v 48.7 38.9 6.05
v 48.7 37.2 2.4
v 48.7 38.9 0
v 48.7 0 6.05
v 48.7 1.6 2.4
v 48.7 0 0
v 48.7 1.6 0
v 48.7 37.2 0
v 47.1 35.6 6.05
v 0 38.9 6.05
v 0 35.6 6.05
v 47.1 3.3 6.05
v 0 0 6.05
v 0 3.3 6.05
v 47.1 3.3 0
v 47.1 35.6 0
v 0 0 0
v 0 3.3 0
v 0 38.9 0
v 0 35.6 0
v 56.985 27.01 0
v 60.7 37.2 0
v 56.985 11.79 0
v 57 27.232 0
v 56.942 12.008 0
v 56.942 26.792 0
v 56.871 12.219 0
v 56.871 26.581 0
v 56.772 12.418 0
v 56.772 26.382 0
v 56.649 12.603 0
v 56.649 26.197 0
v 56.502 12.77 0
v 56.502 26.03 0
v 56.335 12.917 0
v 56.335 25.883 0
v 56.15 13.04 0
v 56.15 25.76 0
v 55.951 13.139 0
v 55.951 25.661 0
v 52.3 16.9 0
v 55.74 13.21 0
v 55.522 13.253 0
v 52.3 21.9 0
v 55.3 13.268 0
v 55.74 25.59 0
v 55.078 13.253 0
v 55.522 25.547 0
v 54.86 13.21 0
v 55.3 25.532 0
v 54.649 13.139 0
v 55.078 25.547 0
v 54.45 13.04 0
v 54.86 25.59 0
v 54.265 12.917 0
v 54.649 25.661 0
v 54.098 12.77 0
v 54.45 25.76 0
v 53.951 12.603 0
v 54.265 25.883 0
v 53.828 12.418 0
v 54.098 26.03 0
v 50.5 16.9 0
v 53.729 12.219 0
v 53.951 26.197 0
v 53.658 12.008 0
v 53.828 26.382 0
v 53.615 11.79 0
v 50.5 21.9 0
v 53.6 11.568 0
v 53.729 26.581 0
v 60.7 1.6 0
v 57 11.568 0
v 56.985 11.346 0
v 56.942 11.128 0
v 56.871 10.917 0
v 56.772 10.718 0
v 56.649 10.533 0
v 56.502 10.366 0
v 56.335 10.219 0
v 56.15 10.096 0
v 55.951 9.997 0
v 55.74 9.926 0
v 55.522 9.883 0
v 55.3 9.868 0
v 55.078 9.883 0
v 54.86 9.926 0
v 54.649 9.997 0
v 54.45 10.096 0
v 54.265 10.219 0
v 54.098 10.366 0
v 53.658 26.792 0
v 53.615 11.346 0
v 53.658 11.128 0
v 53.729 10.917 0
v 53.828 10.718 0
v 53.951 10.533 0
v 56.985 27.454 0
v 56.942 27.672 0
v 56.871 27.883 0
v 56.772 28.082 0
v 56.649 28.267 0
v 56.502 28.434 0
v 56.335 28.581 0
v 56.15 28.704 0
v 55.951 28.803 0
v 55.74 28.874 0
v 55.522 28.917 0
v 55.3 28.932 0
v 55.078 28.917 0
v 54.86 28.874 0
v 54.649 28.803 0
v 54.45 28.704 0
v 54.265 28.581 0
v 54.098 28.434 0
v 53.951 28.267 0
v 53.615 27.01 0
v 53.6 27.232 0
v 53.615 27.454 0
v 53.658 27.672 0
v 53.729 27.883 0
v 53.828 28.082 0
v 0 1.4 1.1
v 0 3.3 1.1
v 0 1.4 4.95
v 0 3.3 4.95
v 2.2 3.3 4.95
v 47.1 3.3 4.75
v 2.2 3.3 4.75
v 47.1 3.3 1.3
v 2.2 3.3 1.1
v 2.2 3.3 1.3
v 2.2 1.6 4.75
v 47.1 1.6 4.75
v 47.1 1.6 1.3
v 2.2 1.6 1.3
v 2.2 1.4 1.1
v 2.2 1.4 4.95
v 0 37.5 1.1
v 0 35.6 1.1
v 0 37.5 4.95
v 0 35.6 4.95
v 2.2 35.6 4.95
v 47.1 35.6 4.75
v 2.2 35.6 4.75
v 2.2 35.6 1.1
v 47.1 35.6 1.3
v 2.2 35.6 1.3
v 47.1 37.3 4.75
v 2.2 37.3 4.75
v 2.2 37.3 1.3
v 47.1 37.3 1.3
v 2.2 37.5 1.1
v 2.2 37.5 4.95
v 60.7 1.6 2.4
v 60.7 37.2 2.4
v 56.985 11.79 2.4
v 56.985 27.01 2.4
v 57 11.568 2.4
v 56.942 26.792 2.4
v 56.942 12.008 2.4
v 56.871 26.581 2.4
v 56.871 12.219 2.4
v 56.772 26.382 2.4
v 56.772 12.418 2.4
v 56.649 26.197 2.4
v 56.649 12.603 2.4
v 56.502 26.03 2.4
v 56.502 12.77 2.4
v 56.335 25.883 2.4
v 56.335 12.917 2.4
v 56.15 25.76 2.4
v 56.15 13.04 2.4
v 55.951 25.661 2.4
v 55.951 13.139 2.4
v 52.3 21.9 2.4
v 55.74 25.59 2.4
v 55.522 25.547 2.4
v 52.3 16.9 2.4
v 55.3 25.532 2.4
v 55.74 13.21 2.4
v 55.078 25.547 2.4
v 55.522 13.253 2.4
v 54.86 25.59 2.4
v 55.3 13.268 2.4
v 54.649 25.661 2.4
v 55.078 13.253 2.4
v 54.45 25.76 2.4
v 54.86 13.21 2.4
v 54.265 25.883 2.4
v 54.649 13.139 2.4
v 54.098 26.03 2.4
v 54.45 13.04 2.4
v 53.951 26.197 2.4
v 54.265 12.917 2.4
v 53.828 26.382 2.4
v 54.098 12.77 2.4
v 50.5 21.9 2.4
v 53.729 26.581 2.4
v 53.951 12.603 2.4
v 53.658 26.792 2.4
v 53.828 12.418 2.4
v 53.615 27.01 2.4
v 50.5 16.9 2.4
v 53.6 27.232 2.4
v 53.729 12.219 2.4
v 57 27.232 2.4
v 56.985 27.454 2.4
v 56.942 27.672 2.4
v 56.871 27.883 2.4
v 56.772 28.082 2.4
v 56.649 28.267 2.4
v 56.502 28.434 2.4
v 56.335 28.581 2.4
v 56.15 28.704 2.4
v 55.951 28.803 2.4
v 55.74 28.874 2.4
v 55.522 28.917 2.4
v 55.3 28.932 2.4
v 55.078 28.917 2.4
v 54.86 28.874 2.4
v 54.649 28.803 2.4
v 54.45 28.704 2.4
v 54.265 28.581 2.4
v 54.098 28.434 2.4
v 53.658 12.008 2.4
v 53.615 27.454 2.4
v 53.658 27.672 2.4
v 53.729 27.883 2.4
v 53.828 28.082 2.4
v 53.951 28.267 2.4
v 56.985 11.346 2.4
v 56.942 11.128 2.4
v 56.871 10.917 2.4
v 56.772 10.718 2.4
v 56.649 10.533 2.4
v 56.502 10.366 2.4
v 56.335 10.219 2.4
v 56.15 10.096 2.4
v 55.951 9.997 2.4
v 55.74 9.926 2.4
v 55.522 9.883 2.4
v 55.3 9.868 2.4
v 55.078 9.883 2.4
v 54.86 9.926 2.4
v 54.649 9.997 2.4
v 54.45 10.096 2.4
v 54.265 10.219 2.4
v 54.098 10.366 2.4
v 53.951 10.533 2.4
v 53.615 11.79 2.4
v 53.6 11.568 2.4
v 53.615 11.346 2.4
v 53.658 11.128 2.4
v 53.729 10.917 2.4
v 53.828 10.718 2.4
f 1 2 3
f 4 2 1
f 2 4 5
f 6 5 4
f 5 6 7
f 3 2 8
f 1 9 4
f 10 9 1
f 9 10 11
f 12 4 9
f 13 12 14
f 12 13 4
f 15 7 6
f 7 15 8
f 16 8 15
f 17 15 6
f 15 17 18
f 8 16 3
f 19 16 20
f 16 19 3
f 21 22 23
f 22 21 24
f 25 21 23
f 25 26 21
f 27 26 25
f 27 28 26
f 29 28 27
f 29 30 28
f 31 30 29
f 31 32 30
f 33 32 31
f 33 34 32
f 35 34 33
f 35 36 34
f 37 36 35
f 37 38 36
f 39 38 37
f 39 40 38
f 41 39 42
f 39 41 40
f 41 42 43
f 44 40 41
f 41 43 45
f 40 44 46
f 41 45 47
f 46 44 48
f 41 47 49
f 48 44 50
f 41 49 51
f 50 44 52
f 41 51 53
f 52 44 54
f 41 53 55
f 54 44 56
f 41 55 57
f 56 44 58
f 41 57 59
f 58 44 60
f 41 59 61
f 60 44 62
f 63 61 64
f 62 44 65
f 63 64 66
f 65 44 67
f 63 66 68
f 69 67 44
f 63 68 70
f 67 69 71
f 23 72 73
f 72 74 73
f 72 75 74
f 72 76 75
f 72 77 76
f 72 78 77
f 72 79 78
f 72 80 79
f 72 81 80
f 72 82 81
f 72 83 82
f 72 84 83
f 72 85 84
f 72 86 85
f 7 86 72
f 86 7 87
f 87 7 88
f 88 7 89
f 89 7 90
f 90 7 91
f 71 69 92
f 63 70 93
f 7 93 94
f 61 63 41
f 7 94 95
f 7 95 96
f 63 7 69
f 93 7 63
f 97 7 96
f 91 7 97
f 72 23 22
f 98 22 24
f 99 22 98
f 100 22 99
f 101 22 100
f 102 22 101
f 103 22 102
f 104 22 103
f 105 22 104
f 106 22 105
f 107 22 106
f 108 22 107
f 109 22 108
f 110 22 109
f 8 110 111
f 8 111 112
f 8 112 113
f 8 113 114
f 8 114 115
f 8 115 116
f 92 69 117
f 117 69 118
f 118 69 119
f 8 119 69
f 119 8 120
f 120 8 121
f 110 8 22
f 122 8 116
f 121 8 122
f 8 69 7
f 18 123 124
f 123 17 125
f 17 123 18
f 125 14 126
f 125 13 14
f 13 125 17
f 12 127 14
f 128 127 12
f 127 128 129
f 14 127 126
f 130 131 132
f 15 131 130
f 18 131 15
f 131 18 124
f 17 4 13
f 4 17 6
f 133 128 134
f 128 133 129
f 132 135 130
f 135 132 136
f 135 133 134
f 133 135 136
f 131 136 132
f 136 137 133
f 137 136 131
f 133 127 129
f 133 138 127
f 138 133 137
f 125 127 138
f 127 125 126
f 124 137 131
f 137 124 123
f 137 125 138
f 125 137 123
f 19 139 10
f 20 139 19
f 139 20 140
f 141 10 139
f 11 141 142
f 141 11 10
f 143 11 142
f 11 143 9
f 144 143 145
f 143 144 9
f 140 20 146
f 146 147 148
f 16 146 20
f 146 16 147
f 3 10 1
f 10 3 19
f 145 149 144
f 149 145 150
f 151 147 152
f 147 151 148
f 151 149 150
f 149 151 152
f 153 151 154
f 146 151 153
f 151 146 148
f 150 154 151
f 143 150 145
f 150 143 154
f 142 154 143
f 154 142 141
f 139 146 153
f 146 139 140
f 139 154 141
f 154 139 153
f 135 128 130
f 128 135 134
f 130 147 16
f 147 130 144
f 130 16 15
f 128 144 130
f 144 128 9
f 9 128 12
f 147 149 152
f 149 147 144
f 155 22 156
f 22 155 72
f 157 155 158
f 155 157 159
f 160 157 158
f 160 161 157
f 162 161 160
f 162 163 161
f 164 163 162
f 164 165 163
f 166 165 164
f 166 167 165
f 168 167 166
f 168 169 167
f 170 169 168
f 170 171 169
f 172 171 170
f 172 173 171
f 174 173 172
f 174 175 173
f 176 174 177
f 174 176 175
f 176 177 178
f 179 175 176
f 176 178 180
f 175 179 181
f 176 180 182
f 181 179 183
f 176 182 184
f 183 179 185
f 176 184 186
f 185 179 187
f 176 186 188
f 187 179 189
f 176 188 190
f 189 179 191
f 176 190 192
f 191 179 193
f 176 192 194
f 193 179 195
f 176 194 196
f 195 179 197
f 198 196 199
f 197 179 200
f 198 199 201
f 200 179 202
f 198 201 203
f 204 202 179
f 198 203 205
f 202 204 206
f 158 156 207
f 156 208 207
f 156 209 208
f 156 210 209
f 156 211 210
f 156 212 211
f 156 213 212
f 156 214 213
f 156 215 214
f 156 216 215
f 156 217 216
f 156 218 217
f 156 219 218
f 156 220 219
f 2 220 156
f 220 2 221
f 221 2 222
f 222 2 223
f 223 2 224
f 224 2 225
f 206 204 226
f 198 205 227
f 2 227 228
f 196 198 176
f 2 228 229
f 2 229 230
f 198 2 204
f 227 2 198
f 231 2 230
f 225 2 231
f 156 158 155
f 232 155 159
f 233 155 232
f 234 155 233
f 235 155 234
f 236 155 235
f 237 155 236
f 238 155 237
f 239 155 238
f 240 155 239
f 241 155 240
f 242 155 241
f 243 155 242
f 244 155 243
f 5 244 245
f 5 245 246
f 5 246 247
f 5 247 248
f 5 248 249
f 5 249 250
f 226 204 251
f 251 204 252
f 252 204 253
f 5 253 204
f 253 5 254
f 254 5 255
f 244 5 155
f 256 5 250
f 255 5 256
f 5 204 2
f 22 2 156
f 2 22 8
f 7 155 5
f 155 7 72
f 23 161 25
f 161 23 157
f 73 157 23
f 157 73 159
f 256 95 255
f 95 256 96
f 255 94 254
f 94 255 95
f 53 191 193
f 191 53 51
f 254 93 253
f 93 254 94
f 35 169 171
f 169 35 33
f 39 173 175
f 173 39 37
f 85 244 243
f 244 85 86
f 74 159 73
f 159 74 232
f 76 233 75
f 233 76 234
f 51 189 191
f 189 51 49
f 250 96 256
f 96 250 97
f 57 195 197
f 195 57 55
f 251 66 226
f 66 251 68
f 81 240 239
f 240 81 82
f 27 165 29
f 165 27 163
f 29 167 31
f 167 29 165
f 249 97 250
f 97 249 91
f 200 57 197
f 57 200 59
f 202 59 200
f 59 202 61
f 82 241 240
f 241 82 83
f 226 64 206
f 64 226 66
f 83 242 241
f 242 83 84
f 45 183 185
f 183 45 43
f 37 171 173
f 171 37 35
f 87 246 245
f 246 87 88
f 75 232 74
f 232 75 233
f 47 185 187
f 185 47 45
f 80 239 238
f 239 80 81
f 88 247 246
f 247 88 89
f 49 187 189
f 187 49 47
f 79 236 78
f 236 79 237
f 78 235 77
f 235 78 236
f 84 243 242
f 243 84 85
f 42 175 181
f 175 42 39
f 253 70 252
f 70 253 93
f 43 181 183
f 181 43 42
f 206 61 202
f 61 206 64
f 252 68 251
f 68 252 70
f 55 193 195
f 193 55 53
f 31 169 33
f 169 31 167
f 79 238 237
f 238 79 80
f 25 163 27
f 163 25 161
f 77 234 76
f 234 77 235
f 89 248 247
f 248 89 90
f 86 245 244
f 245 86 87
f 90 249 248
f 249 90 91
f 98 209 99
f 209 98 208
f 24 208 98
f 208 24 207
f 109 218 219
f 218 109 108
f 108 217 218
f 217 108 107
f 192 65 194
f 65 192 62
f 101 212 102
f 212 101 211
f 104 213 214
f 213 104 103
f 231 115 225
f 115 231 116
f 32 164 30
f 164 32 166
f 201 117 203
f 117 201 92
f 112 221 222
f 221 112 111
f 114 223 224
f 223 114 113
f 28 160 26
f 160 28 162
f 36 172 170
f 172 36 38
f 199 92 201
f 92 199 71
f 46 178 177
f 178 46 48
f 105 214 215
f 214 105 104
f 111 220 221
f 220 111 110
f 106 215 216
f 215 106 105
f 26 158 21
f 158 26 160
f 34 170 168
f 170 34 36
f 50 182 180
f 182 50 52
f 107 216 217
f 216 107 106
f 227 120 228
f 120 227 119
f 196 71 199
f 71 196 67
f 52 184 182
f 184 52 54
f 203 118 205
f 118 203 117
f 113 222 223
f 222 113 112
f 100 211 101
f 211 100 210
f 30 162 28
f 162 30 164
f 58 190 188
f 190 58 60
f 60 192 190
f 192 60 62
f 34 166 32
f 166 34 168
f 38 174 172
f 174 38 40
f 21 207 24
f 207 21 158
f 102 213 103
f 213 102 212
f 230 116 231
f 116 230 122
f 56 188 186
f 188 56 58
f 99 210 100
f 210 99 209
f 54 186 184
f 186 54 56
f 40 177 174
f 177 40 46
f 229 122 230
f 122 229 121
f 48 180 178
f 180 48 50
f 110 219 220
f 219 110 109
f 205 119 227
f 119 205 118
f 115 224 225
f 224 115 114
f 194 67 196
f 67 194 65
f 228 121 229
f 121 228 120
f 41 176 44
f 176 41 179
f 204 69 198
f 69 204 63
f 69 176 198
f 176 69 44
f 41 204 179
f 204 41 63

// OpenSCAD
// file: lib.scad
// Shared solids. Dimensions live in dimensions.scad.

module rounded_rect(x, y, z, r) {
    rr = min(r, min(x, y) / 2 - 0.05);
    hull() {
        for (px = [rr, x - rr])
            for (py = [rr, y - rr])
                translate([px, py, 0])
                    cylinder(h=z, r=rr);
    }
}

// Stadium slot. Long axis X, thickness along Y, centred on the origin.
module stadium_x(length, height, depth) {
    r = min(height / 2, length / 2);
    span = max(length - 2 * r, 0);
    translate([0, -depth / 2, 0])
        hull() {
            for (dx = [-span / 2, span / 2])
                translate([dx, 0, r])
                    rotate([-90, 0, 0])
                        cylinder(h=depth, r=r);
        }
}

// Cantilever finger. Root on z = 0, tip toward +z, inner face on x = 0,
// hook toward +x. `arm` is the distance from the root to the catch face.
// The lead-in drops 45° because `lead` equals the hook's inward reach.
// Sizes are arguments: a file brought in with `use` cannot see the
// caller's variables. The root is buried 0.2 mm into the lid plate, the
// hook overlaps the arm, and the pull tab overlaps the outer face, so
// the finger is one solid.
module latch_finger(arm, t, w, gap, reach, catch_h, lead) {
    hx = gap + reach;
    translate([-t, -w / 2, -0.2])
        cube([t, w, arm + 0.2]);
    translate([-0.02, -w / 2, arm - 0.04])
        cube([hx + 0.02, w, catch_h + 0.04]);
    hull() {
        translate([0, -w / 2, arm + catch_h + lead - 0.04])
            cube([0.05, w, 0.05]);
        translate([hx - 0.05, -w / 2, arm + catch_h - 0.04])
            cube([0.05, w, 0.08]);
    }
    // On the outer face, just under the catch, so a pinch releases it.
    // Buried 0.2 mm into the arm (the hook is inboard of this face).
    translate([-t - 0.8, -1.1, arm - 0.7])
        cube([1.0, 2.2, 0.9]);
}

module deboss_text(label, size, depth=0.65) {
    linear_extrude(height=depth + 0.4)
        offset(delta=0.02)
            text(label, size=size, font="Liberation Sans:style=Bold",
                 halign="center", valign="center");
}

// Right-triangle gusset in the XZ plane, extruded along Y.
// Hypotenuse is the top face, so it prints without support.
// Slide rail on the outside of a long wall. Overlaps the wall by `bite`
// so the union is not a coplanar face. The zip-tie slot stays in the
// rail and does not break into the cavity. A detent near the open end
// is what the bracket jaw flexes over.
module slide_rails(length, width, t, h, end_gap, slot_l, slot_w, detent) {
    bite = 0.4;
    x0 = end_gap;
    span = length - 2 * end_gap;
    for (side = [-1, 1]) {
        y = side < 0 ? -t : width - bite;
        translate([x0, y, 0])
            difference() {
                cube([span, t + bite, h]);
                translate([span / 2 - slot_l / 2,
                           side < 0 ? 0 : bite,
                           (h - slot_w) / 2])
                    cube([slot_l, t + 0.2, slot_w]);
            }
        // Overlap the rail by 0.25 so the detent is not a coplanar face.
        bump_y = side < 0 ? -t - detent : width + t - 0.25;
        translate([x0 + 2.2, bump_y, 0.6])
            cube([1.6, detent + 0.25, h - 1.2]);
    }
}
// main file
// Optional wall bracket. Slides onto the rails of one case and stops
// against the far end. The case is usable without this part: the base
// is flat for tape, and each rail has its own zip-tie slot.
//
//   which = "pico" | "bmp"
//
// Prints flange-down. The jaws are a C-section around the rail, open
// toward the case, so there is no overhang in this orientation.

use <lib.scad>
include <dimensions.scad>

which = "pico";

pico = which == "pico";
body_l = pico ? pico_outer_l : bmp_outer_l;
body_w = pico ? pico_outer_w : bmp_outer_w;

jaw_wall = 1.6;
lip = 1.3;
groove_w = rail_t + rail_clearance;
groove_h = rail_h + 0.25;
jaw_h = lip + groove_h + lip;
jaw_l = body_l - 8.0;
flange_l = 12.0;
flange_t = 2.4;

module fit_checks() {
    assert(which == "pico" || which == "bmp", "which must be pico or bmp");
    assert(groove_w > rail_t + 0.2, "Bracket groove is tight on the rail");
    assert(groove_h > rail_h + 0.15, "Bracket groove is shorter than the rail");
    assert(jaw_l > body_l * 0.5, "Bracket jaws are too short to hold");
    echo("FIT mount", which, "body", body_l, body_w, "jaw", jaw_l, jaw_h);
}

module jaw() {
    difference() {
        cube([jaw_l, jaw_wall + groove_w, jaw_h]);
        translate([-0.2, jaw_wall, lip])
            cube([jaw_l + 0.4, groove_w + 0.2, groove_h]);
        // Lead-in at the open end.
        translate([-0.2, jaw_wall - 0.2, lip - 0.2])
            cube([2.4, groove_w + 0.6, groove_h + 0.4]);
    }
}

module bracket() {
    // Jaws open toward +Y / −Y around a case of width body_w.
    span = body_w + 2 * rail_t + 2 * rail_clearance;
    difference() {
        union() {
            translate([0, 0, 0])
                jaw();
            translate([0, span + jaw_wall + groove_w, 0])
                mirror([0, 1, 0])
                    jaw();
            // End stop, just past the jaws, ties the two sides together.
            translate([jaw_l - 1.6, 0, 0])
                cube([1.6, span + jaw_wall + groove_w, jaw_h]);
            // Screw flange beyond the stop.
            translate([jaw_l, jaw_wall, 0])
                cube([flange_l, span, flange_t]);
        }
        // Two M3 holes and one zip-tie slot in the flange.
        for (dy = [span * 0.28, span * 0.72])
            translate([jaw_l + flange_l * 0.55, jaw_wall + dy, -0.2])
                cylinder(d=m3_clearance_d, h=flange_t + 0.6);
        translate([jaw_l + 1.8, jaw_wall + span / 2 - ziptie_slot_l / 2, -0.2])
            cube([ziptie_slot_w, ziptie_slot_l, flange_t + 0.6]);
    }
}

fit_checks();
bracket();
